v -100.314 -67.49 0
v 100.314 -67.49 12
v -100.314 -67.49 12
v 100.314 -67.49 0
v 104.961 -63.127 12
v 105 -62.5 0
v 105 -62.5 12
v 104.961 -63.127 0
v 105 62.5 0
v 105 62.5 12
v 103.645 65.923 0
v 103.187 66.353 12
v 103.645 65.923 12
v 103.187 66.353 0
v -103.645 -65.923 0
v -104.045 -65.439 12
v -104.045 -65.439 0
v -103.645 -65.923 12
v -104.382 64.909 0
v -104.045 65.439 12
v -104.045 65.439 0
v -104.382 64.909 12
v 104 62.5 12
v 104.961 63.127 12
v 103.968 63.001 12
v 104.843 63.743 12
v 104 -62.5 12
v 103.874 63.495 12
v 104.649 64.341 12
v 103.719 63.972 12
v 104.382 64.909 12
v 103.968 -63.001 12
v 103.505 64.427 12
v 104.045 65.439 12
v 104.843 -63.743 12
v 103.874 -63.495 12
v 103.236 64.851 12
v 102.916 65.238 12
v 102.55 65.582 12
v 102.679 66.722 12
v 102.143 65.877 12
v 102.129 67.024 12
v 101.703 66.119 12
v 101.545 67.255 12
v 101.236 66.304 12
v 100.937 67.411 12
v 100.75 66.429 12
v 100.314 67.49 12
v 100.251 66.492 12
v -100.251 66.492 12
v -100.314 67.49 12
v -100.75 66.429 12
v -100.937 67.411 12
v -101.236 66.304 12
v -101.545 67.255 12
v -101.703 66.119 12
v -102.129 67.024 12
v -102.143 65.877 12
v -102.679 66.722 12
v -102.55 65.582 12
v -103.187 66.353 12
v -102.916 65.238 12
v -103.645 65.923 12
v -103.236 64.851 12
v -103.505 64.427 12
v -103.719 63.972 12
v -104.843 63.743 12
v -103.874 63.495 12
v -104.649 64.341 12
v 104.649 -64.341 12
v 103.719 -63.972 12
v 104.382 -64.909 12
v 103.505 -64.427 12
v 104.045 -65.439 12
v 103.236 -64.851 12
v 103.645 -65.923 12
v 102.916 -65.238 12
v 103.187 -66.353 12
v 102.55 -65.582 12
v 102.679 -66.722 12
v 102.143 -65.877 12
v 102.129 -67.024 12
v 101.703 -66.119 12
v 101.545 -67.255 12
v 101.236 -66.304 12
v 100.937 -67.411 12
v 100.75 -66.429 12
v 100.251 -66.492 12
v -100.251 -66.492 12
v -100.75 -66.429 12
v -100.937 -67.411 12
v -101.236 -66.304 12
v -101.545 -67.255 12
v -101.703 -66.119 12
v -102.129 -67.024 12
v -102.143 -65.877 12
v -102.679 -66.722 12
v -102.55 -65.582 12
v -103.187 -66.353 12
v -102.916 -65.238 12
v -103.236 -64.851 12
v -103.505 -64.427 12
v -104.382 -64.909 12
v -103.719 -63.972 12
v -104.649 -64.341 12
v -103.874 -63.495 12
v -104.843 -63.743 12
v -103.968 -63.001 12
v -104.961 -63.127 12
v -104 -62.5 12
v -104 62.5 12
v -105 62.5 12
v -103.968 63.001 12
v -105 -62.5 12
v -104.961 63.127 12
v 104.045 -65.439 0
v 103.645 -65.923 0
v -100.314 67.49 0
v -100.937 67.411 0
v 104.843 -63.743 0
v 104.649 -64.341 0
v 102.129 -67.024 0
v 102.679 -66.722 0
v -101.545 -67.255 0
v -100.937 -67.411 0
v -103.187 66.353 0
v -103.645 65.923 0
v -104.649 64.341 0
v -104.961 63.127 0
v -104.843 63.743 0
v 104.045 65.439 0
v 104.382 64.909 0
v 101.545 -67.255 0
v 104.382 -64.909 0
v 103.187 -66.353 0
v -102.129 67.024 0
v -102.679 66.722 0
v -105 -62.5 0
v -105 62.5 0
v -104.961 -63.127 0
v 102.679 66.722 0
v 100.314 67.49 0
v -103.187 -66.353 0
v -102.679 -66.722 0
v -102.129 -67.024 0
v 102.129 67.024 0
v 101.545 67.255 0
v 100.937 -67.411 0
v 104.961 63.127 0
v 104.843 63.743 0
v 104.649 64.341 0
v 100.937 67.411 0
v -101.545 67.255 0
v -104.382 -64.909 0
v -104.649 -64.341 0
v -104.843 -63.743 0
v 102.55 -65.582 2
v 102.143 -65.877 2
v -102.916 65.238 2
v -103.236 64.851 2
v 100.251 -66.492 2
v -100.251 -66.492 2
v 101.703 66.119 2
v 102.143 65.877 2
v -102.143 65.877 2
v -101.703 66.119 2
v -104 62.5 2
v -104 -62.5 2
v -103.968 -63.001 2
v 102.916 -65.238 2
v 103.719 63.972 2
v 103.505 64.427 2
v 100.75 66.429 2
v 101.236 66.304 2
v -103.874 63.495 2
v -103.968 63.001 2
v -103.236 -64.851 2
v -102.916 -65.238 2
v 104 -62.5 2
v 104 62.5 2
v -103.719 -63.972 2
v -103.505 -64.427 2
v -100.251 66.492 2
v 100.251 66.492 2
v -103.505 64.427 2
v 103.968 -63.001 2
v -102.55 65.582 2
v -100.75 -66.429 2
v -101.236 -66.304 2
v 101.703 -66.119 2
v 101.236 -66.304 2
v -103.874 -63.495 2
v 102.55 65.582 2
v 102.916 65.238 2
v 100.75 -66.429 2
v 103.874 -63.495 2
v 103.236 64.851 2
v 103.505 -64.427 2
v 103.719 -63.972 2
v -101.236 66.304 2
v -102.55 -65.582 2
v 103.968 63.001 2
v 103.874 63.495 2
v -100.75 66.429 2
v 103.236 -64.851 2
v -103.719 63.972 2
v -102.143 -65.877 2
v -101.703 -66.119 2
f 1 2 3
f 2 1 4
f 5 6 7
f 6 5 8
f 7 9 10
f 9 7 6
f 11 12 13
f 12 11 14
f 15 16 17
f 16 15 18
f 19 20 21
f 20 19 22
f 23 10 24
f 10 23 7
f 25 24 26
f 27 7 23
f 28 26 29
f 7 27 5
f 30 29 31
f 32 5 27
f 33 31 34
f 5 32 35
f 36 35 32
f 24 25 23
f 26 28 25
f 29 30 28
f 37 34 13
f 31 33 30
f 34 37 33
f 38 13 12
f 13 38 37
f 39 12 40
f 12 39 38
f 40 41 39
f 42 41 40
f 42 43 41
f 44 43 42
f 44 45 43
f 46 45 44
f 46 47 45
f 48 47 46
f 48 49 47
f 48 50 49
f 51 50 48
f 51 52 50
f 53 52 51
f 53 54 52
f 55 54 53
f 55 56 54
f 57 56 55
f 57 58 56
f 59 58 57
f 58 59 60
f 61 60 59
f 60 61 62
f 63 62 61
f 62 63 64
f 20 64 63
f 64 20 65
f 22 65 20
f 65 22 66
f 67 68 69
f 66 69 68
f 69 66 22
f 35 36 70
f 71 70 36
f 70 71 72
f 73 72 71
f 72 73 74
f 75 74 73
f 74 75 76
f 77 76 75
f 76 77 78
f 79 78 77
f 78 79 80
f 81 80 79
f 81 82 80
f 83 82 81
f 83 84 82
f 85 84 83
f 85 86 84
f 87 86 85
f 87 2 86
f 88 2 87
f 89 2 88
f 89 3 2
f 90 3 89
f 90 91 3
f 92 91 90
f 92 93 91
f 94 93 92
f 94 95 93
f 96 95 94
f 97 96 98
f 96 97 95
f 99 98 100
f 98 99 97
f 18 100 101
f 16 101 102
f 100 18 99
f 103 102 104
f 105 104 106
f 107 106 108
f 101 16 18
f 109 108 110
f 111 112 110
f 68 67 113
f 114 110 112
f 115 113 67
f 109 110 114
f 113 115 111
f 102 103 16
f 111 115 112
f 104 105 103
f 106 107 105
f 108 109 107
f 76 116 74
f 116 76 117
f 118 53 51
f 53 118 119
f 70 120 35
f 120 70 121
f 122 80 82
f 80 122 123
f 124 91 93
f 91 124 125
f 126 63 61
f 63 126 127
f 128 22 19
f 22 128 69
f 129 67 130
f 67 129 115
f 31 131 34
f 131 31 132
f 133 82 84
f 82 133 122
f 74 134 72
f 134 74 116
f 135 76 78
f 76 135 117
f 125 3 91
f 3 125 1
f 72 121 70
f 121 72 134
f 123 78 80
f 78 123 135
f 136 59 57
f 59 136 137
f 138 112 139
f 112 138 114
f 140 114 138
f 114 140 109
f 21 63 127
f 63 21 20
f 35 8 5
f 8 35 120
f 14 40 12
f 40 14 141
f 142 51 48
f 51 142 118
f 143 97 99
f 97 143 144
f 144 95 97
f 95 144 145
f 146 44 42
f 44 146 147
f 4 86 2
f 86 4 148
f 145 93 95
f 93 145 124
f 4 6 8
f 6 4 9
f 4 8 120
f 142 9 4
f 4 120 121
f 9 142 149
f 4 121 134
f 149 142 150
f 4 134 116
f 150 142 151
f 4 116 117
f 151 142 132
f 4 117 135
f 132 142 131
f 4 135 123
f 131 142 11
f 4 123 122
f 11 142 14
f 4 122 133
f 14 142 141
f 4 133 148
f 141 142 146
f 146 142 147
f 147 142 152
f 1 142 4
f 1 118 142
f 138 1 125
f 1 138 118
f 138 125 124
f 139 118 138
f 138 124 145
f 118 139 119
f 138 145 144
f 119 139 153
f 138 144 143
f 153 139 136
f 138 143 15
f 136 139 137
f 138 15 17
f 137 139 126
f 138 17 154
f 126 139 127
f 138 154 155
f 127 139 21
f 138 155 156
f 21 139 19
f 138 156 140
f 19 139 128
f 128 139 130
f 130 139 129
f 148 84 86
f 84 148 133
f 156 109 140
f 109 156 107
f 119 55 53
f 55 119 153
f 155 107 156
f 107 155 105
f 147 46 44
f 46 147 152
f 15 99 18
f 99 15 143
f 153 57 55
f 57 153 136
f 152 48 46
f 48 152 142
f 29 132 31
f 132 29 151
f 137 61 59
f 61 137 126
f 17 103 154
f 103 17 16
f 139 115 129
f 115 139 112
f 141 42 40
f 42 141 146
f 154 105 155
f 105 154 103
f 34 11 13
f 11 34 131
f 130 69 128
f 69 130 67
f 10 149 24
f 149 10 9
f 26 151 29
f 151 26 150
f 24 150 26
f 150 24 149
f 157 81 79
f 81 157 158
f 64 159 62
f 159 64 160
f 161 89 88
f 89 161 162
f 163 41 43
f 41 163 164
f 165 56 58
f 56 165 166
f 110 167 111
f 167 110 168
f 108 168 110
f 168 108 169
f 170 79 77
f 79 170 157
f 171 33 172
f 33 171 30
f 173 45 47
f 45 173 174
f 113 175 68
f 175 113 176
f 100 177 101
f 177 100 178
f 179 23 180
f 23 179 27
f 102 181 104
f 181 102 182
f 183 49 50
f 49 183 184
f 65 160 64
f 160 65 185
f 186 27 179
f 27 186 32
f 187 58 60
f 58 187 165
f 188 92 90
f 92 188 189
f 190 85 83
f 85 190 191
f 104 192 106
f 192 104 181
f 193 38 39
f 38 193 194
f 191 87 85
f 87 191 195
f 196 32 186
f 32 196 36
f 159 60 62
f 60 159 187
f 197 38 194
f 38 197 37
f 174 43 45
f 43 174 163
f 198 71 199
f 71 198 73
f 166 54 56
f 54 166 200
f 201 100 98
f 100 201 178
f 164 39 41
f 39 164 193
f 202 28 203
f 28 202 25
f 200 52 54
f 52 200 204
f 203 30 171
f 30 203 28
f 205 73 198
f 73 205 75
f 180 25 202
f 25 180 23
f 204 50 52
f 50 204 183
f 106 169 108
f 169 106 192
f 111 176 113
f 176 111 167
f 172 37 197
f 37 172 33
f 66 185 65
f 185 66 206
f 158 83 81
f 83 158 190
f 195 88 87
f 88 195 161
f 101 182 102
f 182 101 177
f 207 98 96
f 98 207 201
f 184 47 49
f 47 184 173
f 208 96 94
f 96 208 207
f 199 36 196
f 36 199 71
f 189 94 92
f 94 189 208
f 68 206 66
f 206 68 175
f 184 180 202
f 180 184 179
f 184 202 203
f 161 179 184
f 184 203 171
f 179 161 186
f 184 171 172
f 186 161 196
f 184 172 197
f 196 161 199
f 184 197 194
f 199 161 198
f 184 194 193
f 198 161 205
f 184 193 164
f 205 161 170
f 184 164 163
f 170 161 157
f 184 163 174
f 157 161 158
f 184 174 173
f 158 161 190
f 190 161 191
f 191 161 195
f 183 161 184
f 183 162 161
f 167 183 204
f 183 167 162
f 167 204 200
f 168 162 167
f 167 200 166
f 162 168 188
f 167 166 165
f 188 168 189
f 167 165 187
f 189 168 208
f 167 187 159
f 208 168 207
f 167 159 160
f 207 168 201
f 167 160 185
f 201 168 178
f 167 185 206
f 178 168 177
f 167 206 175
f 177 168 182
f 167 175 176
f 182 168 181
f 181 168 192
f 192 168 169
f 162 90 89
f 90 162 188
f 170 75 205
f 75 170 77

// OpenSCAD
$fn = 50;


difference() {
	union() {
		hull() {
			translate(v = [-100.0000000000, 62.5000000000, 0]) {
				cylinder(h = 12, r = 5);
			}
			translate(v = [100.0000000000, 62.5000000000, 0]) {
				cylinder(h = 12, r = 5);
			}
			translate(v = [-100.0000000000, -62.5000000000, 0]) {
				cylinder(h = 12, r = 5);
			}
			translate(v = [100.0000000000, -62.5000000000, 0]) {
				cylinder(h = 12, r = 5);
			}
		}
	}
	union() {
		translate(v = [0, 0, 2]) {
			hull() {
				translate(v = [-100.0000000000, 62.5000000000, 0]) {
					cylinder(h = 10, r = 4);
				}
				translate(v = [100.0000000000, 62.5000000000, 0]) {
					cylinder(h = 10, r = 4);
				}
				translate(v = [-100.0000000000, -62.5000000000, 0]) {
					cylinder(h = 10, r = 4);
				}
				translate(v = [100.0000000000, -62.5000000000, 0]) {
					cylinder(h = 10, r = 4);
				}
			}
		}
	}
}
